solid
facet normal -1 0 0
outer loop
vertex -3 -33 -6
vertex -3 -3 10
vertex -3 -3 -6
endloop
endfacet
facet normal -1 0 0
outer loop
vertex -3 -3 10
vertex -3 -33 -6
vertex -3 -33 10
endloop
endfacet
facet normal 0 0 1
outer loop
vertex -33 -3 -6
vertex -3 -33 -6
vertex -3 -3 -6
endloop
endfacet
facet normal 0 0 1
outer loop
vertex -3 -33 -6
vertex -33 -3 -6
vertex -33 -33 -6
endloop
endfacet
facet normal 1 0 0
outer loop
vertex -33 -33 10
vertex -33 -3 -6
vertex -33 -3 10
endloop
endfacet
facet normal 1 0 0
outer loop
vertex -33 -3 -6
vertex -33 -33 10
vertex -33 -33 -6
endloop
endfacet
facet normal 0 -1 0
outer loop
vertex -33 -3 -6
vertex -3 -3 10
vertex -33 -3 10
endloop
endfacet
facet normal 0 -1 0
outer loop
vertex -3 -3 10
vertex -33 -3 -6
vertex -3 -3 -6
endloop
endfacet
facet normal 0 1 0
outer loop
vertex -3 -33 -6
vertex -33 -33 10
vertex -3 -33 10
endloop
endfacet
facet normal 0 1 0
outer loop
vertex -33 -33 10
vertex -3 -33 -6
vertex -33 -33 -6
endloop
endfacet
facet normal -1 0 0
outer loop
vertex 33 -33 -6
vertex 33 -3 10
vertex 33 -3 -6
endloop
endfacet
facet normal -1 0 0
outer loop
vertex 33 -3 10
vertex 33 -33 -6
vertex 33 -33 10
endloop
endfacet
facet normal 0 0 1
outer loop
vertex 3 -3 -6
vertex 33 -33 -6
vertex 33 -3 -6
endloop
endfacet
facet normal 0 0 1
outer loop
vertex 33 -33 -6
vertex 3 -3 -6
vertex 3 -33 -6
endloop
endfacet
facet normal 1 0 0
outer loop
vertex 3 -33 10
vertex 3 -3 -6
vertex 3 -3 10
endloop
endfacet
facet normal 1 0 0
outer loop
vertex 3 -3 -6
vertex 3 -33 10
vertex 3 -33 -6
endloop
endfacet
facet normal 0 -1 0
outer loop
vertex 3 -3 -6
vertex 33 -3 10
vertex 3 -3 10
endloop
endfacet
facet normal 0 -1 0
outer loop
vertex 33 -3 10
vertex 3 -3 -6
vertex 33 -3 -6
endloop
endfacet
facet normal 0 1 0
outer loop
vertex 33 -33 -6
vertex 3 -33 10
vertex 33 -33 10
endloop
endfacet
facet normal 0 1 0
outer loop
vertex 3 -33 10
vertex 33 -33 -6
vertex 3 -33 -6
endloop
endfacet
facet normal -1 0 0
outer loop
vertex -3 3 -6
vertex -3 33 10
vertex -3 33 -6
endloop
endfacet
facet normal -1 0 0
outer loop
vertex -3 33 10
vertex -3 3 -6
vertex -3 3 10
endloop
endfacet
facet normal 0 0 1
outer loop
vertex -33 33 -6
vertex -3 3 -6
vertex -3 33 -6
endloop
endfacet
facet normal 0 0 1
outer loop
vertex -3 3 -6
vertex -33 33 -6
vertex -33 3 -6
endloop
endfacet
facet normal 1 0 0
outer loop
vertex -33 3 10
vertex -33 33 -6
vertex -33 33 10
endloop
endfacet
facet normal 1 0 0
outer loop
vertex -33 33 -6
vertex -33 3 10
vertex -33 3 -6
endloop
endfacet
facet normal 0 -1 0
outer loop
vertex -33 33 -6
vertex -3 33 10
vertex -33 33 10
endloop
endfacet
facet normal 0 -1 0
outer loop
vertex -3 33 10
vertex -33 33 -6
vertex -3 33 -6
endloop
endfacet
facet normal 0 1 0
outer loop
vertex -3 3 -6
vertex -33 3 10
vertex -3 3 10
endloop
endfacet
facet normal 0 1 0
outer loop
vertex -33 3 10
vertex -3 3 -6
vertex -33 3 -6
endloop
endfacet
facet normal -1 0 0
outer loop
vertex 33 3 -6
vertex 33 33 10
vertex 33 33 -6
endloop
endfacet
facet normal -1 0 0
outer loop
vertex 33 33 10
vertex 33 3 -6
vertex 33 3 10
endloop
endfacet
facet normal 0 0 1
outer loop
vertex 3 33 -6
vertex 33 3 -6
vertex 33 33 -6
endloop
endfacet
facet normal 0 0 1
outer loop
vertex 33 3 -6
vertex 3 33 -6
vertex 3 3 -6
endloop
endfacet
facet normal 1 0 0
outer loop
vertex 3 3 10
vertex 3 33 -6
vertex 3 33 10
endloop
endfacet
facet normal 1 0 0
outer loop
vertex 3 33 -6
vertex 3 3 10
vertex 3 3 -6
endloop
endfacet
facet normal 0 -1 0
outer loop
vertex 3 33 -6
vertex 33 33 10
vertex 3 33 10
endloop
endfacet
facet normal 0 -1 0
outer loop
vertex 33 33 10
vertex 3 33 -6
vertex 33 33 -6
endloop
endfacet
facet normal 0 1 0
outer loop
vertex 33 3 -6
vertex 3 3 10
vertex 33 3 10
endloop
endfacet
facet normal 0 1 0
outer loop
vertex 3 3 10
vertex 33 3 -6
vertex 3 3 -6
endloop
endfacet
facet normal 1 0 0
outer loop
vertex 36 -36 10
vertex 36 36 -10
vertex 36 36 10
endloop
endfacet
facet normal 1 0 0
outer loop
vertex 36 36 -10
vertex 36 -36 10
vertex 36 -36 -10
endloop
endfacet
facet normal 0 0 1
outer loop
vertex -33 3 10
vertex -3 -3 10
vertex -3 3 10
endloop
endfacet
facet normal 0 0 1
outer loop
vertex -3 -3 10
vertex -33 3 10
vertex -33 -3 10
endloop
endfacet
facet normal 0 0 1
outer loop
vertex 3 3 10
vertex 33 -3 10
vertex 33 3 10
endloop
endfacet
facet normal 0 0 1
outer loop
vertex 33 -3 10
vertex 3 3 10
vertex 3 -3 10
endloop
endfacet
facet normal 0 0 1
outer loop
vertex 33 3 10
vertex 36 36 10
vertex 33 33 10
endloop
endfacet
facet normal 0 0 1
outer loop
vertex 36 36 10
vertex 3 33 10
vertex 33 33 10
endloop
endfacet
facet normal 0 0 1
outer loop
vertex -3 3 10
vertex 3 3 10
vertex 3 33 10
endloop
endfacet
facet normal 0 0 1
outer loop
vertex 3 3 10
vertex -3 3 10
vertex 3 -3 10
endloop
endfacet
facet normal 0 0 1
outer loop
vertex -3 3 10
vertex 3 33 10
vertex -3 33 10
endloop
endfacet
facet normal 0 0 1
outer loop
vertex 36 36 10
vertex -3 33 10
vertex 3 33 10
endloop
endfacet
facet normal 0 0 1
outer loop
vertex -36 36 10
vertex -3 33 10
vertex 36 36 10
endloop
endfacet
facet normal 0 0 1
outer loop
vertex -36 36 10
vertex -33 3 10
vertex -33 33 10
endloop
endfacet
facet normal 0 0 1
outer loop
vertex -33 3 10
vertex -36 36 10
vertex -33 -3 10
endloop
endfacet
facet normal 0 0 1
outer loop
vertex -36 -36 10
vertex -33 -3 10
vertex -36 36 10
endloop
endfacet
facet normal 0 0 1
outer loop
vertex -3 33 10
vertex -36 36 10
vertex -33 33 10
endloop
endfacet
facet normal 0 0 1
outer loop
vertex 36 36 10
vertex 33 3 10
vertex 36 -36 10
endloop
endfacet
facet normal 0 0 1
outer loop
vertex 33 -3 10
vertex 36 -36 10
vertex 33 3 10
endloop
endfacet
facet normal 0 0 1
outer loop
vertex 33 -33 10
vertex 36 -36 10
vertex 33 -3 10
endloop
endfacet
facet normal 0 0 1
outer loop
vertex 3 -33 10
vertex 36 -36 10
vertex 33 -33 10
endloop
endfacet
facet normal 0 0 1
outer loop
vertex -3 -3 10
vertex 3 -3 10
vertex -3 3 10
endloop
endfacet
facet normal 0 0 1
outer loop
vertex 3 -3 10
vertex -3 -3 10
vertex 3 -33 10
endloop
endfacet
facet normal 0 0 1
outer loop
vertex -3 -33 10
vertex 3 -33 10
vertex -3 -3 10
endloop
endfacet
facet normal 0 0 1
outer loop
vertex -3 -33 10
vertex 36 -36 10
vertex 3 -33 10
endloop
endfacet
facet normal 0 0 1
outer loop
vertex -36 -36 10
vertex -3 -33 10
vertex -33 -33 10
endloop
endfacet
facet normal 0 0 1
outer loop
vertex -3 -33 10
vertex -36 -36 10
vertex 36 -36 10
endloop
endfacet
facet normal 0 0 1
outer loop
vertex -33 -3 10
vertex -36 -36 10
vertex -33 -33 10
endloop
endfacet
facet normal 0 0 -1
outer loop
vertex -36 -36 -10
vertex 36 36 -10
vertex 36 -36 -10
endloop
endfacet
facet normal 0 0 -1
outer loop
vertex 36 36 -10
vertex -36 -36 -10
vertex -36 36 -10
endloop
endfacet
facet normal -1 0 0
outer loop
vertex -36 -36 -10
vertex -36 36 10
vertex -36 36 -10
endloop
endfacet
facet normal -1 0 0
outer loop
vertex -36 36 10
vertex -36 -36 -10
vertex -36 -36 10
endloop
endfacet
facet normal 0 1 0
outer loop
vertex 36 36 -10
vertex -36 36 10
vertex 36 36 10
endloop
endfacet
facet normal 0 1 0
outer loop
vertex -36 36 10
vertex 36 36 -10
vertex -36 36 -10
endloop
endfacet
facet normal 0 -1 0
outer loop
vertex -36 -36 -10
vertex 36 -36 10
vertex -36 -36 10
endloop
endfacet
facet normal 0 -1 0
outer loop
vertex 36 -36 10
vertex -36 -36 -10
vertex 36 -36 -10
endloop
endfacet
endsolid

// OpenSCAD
$fn = 32;

// ----------------------------------------------------------------------
// Pocket plate 72 x 72 x 20
// 2 x 2 pockets 30 mm square, 16 mm deep
// ----------------------------------------------------------------------

// --- parameters (mm) ---
thickness = 20;  // plate thickness
floor_t = 4;     // material left under each pocket
pocket = 30;     // pocket side length
pitch_x = 36;    // pocket pitch along X
pitch_y = 36;    // pocket pitch along Y
cols = 2;        // pockets per row
rows = 2;        // rows of pockets

// --- derived feature positions (mm) ---
depth = thickness - floor_t;        // = 16   pocket depth, down to the floor
span_x = (cols - 1) * pitch_x;      // = 36   distance between outer pockets
span_y = (rows - 1) * pitch_y;      // = 36   distance between outer pocket rows
origin_x = -span_x / 2;             // = -18   X of the first pocket
origin_y = -span_y / 2;             // = -18   Y of the first pocket
plate = [span_x + pocket + 6, span_y + pocket + 6, thickness];  // = [72, 72, 20]   overall size: pockets plus 3 mm of wall on each side
feature_centers = [
  [origin_x + 0 * pitch_x, origin_y + 0 * pitch_y],
  [origin_x + 1 * pitch_x, origin_y + 0 * pitch_y],
  [origin_x + 0 * pitch_x, origin_y + 1 * pitch_y],
  [origin_x + 1 * pitch_x, origin_y + 1 * pitch_y]
];   // pocket centres, used verbatim by the cutter loop

// plate outline, then one pocket per centre in feature_centers
difference() {
  cube(plate, center = true);
  for (centre = feature_centers)
    translate([centre[0] - pocket / 2, centre[1] - pocket / 2, plate[2] / 2 - depth])
      cube([pocket, pocket, depth + 1]);  // centred on the declared pocket centre
}
